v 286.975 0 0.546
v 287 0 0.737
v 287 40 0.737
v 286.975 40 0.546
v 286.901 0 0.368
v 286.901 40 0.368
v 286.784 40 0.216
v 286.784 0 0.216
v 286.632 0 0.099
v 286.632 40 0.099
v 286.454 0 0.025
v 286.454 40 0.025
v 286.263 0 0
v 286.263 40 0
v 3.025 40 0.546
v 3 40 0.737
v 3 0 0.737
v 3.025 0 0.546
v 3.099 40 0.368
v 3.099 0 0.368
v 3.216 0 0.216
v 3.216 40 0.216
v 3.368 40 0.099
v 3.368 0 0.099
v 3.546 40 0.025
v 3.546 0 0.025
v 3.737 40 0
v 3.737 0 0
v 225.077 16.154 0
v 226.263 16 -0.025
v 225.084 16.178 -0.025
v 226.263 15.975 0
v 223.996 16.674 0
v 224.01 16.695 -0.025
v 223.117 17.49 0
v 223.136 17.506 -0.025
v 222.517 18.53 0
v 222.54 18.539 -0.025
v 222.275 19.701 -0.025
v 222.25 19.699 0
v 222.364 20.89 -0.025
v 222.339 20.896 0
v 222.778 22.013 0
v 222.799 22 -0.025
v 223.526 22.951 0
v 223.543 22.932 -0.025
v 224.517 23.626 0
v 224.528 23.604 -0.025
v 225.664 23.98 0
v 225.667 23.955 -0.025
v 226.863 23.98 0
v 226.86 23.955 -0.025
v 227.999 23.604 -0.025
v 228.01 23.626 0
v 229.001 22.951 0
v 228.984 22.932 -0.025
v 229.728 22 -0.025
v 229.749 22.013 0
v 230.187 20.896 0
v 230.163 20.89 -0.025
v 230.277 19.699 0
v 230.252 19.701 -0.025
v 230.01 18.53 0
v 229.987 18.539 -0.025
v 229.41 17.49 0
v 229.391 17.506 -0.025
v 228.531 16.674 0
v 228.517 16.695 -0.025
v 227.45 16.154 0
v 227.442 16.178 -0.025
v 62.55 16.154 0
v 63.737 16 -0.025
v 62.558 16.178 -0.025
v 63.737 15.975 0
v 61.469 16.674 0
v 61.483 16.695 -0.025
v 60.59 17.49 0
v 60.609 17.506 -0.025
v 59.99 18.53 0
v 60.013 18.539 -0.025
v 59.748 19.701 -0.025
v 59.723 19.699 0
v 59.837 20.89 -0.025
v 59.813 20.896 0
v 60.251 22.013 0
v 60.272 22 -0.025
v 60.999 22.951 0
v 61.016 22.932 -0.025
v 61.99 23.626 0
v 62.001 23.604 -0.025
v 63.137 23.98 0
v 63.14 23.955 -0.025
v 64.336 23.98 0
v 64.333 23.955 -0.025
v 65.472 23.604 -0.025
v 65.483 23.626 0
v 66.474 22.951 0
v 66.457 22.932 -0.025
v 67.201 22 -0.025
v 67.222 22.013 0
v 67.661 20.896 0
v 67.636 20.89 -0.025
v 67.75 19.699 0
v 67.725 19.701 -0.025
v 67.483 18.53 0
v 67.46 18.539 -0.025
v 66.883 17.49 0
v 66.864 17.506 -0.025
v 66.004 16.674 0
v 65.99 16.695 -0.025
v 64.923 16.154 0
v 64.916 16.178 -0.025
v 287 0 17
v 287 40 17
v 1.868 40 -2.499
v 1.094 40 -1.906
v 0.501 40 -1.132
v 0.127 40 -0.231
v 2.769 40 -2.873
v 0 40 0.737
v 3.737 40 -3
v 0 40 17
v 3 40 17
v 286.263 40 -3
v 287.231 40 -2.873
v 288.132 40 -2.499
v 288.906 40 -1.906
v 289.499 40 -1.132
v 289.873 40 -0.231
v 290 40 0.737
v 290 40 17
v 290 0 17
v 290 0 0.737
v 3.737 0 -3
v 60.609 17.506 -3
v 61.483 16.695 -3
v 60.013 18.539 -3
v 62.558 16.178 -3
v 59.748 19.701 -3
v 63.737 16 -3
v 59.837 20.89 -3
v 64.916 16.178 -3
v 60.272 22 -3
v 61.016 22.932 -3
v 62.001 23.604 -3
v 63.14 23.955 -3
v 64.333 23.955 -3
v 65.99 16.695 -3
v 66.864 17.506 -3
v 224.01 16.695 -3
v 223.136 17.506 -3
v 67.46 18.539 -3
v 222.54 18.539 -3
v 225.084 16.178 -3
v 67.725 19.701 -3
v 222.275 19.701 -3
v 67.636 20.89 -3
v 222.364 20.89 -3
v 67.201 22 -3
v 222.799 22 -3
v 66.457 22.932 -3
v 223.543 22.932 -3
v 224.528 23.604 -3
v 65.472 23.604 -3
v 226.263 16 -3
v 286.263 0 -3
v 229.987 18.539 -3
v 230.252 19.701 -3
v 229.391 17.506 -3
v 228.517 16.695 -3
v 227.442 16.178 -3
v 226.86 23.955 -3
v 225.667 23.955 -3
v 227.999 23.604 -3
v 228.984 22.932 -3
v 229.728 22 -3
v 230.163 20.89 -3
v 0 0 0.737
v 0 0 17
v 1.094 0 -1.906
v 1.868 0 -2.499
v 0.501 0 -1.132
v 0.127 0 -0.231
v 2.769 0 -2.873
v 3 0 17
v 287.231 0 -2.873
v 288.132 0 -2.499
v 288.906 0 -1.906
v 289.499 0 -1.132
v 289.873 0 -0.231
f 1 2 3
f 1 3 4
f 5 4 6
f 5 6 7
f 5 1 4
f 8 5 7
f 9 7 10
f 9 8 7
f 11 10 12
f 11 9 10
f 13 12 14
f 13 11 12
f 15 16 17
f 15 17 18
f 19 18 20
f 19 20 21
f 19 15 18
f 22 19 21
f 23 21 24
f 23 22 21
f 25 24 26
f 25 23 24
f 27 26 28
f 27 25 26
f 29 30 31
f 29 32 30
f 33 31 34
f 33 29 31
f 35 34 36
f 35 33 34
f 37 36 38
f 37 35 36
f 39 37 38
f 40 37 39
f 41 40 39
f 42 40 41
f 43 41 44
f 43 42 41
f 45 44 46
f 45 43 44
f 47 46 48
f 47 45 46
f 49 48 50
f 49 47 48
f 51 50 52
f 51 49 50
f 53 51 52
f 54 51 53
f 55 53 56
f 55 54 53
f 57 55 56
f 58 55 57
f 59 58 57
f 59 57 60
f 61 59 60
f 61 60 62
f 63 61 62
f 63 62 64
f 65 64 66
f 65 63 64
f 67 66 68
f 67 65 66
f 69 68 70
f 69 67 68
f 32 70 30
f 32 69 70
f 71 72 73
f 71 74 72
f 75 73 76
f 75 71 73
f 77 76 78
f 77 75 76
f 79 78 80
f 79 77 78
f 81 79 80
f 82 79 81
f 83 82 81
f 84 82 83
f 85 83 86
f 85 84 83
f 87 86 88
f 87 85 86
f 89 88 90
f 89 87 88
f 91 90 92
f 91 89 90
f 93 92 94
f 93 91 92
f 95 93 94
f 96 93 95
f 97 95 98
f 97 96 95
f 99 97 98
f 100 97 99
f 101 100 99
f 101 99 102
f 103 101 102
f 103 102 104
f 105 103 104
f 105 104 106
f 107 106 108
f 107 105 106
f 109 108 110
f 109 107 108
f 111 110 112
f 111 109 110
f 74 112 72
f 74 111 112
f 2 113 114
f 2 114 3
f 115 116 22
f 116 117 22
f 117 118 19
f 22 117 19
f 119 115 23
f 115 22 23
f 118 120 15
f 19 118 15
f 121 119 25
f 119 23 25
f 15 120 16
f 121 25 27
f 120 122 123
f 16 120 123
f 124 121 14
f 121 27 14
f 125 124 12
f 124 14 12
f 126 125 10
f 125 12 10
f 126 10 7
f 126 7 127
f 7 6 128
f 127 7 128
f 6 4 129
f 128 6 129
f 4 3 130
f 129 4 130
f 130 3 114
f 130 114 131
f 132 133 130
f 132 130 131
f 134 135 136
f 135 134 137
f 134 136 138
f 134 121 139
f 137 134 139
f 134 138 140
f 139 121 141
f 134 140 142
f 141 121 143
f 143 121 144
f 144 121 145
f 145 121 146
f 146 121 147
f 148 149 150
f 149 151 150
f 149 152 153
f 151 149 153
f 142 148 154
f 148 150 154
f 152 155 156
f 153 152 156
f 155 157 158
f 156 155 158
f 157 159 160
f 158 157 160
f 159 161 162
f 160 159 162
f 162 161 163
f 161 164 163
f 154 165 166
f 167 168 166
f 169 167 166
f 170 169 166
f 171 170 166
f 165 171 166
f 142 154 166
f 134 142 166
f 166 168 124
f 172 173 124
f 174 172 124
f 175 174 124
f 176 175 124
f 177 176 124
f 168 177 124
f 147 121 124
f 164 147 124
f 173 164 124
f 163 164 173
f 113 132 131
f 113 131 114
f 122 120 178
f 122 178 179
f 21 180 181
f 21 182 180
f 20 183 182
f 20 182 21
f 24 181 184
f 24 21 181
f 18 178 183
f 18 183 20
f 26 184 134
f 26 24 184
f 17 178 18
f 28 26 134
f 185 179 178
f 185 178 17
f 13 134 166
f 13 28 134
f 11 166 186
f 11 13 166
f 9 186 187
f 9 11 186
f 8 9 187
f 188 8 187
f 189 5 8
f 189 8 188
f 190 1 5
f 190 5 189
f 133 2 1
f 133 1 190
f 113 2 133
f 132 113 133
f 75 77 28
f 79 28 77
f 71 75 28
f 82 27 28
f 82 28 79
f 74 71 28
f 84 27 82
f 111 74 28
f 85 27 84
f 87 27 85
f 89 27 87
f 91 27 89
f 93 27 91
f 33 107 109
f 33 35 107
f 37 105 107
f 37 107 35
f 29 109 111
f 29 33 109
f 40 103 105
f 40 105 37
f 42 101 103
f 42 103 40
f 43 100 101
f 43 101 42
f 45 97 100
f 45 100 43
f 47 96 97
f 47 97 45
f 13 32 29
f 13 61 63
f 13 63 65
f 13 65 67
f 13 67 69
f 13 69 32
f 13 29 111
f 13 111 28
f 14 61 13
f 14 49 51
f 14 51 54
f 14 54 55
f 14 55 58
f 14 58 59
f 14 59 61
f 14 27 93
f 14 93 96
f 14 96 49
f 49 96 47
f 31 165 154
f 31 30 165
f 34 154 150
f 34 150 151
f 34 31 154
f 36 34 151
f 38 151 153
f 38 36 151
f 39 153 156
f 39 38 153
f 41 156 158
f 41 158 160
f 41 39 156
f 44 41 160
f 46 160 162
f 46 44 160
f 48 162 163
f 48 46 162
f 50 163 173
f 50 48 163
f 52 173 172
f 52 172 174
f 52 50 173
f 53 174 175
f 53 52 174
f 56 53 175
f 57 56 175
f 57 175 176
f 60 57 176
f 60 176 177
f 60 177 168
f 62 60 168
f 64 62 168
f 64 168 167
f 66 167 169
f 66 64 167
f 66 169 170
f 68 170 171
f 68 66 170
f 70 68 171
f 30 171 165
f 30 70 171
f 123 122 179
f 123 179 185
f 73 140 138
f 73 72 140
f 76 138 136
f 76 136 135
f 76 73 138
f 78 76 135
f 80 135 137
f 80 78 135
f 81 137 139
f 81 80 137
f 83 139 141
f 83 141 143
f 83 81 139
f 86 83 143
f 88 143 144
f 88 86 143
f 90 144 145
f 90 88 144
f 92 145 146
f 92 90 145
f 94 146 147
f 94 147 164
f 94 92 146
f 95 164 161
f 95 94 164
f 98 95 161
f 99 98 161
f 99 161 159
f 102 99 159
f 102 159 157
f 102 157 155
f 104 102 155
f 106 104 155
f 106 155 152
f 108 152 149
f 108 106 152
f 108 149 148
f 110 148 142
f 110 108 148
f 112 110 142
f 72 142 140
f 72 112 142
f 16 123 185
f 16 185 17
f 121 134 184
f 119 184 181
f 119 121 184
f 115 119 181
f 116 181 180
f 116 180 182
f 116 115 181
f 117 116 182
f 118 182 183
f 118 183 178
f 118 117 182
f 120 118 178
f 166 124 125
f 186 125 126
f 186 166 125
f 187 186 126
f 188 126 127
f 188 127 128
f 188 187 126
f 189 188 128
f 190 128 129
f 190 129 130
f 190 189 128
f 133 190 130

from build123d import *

# Parameters (mm, degrees)
SKETCH1_W                      = 290
SKETCH1_H                      = 40
BASE_FLANGE1_DEPTH             = 3
EDGE_FLANGE1_STRIP_W           = 13.4732
EDGE_FLANGE1_STRIP_H           = 3
EDGE_FLANGE1_STRIP_CUT_DEPTH   = 40
EDGE_FLANGE1_DEPTH             = 40
EDGE_FLANGE2_STRIP_W           = 13.4732
EDGE_FLANGE2_STRIP_H           = 3
EDGE_FLANGE2_STRIP_CUT_DEPTH   = 40
EDGE_FLANGE2_DEPTH             = 40
F_8_0MM_DOWEL_HOLE1_AT_2_COUNT = 2
F_8_0MM_DOWEL_HOLE1_AT_2_PITCH = 162.5268


# Sheet-metal steps are written as plain solids
with BuildPart() as part:
    # Sketch1 → Base-Flange1 (new body)
    with BuildSketch(Plane.XY):
        with Locations((145, 20)):
            Rectangle(SKETCH1_W, SKETCH1_H)
    extrude(amount=-BASE_FLANGE1_DEPTH)

    # Edge-Flange1 strip (across the edge) → Edge-Flange1 strip cut (cut)
    with BuildSketch(Plane.XZ.offset(-40)):
        with Locations((-3, -1.5)):
            Rectangle(EDGE_FLANGE1_STRIP_W, EDGE_FLANGE1_STRIP_H)
    extrude(amount=EDGE_FLANGE1_STRIP_CUT_DEPTH, mode=Mode.SUBTRACT)

    # Edge-Flange1 section (across the edge) → Edge-Flange1 (add)
    with BuildSketch(Plane.XZ.offset(-40)):
        with BuildLine():
            Line((0, 0.7366), (0, 17))
            Line((0, 17), (3, 17))
            Line((3, 17), (3, 0.7366))
            ThreePointArc((3, 0.7366), (3.215745145, 0.215745145), (3.7366, 0))
            Line((3.7366, 0), (3.7366, -3))
            ThreePointArc((3.7366, -3), (1.094424801, -1.905575199), (0, 0.7366))
        make_face()
    extrude(amount=EDGE_FLANGE1_DEPTH)

    # Edge-Flange2 strip (across the edge) → Edge-Flange2 strip cut (cut)
    with BuildSketch(Plane(origin=(290, 0, 0), x_dir=(-1, 0, 0), z_dir=(0, 1, 0))):
        with Locations((-3, -1.5)):
            Rectangle(EDGE_FLANGE2_STRIP_W, EDGE_FLANGE2_STRIP_H)
    extrude(amount=EDGE_FLANGE2_STRIP_CUT_DEPTH, mode=Mode.SUBTRACT)

    # Edge-Flange2 section (across the edge) → Edge-Flange2 (add)
    with BuildSketch(Plane(origin=(290, 0, 0), x_dir=(-1, 0, 0), z_dir=(0, 1, 0))):
        with BuildLine():
            Line((0, 0.7366), (0, 17))
            Line((0, 17), (3, 17))
            Line((3, 17), (3, 0.7366))
            ThreePointArc((3, 0.7366), (3.215745145, 0.215745145), (3.7366, 0))
            Line((3.7366, 0), (3.7366, -3))
            ThreePointArc((3.7366, -3), (1.094424801, -1.905575199), (0, 0.7366))
        make_face()
    extrude(amount=EDGE_FLANGE2_DEPTH)

    # Sketch13 → Ø8.0mm Dowel Hole1 (revolve, cut)
    with BuildSketch(Plane(origin=(226.2634, 20, 0), x_dir=(0, -1, 0), z_dir=(1, 0, 0))):
        Polygon((0, 0), (0, 3), (4, 3), (4, 0.025), (4.025, 0), align=None)
    f_8_0mm_dowel_hole1 = revolve(axis=Axis((226.2634, 20, 6.35), (0, 0, -1)), mode=Mode.SUBTRACT)

    # Ø8.0mm Dowel Hole1 at 2: Ø8.0mm Dowel Hole1 ×2
    with Locations(*[(-i * F_8_0MM_DOWEL_HOLE1_AT_2_PITCH, 0, 0) for i in range(1, F_8_0MM_DOWEL_HOLE1_AT_2_COUNT)]):
        add(f_8_0mm_dowel_hole1, mode=Mode.SUBTRACT)


solid = part.part
